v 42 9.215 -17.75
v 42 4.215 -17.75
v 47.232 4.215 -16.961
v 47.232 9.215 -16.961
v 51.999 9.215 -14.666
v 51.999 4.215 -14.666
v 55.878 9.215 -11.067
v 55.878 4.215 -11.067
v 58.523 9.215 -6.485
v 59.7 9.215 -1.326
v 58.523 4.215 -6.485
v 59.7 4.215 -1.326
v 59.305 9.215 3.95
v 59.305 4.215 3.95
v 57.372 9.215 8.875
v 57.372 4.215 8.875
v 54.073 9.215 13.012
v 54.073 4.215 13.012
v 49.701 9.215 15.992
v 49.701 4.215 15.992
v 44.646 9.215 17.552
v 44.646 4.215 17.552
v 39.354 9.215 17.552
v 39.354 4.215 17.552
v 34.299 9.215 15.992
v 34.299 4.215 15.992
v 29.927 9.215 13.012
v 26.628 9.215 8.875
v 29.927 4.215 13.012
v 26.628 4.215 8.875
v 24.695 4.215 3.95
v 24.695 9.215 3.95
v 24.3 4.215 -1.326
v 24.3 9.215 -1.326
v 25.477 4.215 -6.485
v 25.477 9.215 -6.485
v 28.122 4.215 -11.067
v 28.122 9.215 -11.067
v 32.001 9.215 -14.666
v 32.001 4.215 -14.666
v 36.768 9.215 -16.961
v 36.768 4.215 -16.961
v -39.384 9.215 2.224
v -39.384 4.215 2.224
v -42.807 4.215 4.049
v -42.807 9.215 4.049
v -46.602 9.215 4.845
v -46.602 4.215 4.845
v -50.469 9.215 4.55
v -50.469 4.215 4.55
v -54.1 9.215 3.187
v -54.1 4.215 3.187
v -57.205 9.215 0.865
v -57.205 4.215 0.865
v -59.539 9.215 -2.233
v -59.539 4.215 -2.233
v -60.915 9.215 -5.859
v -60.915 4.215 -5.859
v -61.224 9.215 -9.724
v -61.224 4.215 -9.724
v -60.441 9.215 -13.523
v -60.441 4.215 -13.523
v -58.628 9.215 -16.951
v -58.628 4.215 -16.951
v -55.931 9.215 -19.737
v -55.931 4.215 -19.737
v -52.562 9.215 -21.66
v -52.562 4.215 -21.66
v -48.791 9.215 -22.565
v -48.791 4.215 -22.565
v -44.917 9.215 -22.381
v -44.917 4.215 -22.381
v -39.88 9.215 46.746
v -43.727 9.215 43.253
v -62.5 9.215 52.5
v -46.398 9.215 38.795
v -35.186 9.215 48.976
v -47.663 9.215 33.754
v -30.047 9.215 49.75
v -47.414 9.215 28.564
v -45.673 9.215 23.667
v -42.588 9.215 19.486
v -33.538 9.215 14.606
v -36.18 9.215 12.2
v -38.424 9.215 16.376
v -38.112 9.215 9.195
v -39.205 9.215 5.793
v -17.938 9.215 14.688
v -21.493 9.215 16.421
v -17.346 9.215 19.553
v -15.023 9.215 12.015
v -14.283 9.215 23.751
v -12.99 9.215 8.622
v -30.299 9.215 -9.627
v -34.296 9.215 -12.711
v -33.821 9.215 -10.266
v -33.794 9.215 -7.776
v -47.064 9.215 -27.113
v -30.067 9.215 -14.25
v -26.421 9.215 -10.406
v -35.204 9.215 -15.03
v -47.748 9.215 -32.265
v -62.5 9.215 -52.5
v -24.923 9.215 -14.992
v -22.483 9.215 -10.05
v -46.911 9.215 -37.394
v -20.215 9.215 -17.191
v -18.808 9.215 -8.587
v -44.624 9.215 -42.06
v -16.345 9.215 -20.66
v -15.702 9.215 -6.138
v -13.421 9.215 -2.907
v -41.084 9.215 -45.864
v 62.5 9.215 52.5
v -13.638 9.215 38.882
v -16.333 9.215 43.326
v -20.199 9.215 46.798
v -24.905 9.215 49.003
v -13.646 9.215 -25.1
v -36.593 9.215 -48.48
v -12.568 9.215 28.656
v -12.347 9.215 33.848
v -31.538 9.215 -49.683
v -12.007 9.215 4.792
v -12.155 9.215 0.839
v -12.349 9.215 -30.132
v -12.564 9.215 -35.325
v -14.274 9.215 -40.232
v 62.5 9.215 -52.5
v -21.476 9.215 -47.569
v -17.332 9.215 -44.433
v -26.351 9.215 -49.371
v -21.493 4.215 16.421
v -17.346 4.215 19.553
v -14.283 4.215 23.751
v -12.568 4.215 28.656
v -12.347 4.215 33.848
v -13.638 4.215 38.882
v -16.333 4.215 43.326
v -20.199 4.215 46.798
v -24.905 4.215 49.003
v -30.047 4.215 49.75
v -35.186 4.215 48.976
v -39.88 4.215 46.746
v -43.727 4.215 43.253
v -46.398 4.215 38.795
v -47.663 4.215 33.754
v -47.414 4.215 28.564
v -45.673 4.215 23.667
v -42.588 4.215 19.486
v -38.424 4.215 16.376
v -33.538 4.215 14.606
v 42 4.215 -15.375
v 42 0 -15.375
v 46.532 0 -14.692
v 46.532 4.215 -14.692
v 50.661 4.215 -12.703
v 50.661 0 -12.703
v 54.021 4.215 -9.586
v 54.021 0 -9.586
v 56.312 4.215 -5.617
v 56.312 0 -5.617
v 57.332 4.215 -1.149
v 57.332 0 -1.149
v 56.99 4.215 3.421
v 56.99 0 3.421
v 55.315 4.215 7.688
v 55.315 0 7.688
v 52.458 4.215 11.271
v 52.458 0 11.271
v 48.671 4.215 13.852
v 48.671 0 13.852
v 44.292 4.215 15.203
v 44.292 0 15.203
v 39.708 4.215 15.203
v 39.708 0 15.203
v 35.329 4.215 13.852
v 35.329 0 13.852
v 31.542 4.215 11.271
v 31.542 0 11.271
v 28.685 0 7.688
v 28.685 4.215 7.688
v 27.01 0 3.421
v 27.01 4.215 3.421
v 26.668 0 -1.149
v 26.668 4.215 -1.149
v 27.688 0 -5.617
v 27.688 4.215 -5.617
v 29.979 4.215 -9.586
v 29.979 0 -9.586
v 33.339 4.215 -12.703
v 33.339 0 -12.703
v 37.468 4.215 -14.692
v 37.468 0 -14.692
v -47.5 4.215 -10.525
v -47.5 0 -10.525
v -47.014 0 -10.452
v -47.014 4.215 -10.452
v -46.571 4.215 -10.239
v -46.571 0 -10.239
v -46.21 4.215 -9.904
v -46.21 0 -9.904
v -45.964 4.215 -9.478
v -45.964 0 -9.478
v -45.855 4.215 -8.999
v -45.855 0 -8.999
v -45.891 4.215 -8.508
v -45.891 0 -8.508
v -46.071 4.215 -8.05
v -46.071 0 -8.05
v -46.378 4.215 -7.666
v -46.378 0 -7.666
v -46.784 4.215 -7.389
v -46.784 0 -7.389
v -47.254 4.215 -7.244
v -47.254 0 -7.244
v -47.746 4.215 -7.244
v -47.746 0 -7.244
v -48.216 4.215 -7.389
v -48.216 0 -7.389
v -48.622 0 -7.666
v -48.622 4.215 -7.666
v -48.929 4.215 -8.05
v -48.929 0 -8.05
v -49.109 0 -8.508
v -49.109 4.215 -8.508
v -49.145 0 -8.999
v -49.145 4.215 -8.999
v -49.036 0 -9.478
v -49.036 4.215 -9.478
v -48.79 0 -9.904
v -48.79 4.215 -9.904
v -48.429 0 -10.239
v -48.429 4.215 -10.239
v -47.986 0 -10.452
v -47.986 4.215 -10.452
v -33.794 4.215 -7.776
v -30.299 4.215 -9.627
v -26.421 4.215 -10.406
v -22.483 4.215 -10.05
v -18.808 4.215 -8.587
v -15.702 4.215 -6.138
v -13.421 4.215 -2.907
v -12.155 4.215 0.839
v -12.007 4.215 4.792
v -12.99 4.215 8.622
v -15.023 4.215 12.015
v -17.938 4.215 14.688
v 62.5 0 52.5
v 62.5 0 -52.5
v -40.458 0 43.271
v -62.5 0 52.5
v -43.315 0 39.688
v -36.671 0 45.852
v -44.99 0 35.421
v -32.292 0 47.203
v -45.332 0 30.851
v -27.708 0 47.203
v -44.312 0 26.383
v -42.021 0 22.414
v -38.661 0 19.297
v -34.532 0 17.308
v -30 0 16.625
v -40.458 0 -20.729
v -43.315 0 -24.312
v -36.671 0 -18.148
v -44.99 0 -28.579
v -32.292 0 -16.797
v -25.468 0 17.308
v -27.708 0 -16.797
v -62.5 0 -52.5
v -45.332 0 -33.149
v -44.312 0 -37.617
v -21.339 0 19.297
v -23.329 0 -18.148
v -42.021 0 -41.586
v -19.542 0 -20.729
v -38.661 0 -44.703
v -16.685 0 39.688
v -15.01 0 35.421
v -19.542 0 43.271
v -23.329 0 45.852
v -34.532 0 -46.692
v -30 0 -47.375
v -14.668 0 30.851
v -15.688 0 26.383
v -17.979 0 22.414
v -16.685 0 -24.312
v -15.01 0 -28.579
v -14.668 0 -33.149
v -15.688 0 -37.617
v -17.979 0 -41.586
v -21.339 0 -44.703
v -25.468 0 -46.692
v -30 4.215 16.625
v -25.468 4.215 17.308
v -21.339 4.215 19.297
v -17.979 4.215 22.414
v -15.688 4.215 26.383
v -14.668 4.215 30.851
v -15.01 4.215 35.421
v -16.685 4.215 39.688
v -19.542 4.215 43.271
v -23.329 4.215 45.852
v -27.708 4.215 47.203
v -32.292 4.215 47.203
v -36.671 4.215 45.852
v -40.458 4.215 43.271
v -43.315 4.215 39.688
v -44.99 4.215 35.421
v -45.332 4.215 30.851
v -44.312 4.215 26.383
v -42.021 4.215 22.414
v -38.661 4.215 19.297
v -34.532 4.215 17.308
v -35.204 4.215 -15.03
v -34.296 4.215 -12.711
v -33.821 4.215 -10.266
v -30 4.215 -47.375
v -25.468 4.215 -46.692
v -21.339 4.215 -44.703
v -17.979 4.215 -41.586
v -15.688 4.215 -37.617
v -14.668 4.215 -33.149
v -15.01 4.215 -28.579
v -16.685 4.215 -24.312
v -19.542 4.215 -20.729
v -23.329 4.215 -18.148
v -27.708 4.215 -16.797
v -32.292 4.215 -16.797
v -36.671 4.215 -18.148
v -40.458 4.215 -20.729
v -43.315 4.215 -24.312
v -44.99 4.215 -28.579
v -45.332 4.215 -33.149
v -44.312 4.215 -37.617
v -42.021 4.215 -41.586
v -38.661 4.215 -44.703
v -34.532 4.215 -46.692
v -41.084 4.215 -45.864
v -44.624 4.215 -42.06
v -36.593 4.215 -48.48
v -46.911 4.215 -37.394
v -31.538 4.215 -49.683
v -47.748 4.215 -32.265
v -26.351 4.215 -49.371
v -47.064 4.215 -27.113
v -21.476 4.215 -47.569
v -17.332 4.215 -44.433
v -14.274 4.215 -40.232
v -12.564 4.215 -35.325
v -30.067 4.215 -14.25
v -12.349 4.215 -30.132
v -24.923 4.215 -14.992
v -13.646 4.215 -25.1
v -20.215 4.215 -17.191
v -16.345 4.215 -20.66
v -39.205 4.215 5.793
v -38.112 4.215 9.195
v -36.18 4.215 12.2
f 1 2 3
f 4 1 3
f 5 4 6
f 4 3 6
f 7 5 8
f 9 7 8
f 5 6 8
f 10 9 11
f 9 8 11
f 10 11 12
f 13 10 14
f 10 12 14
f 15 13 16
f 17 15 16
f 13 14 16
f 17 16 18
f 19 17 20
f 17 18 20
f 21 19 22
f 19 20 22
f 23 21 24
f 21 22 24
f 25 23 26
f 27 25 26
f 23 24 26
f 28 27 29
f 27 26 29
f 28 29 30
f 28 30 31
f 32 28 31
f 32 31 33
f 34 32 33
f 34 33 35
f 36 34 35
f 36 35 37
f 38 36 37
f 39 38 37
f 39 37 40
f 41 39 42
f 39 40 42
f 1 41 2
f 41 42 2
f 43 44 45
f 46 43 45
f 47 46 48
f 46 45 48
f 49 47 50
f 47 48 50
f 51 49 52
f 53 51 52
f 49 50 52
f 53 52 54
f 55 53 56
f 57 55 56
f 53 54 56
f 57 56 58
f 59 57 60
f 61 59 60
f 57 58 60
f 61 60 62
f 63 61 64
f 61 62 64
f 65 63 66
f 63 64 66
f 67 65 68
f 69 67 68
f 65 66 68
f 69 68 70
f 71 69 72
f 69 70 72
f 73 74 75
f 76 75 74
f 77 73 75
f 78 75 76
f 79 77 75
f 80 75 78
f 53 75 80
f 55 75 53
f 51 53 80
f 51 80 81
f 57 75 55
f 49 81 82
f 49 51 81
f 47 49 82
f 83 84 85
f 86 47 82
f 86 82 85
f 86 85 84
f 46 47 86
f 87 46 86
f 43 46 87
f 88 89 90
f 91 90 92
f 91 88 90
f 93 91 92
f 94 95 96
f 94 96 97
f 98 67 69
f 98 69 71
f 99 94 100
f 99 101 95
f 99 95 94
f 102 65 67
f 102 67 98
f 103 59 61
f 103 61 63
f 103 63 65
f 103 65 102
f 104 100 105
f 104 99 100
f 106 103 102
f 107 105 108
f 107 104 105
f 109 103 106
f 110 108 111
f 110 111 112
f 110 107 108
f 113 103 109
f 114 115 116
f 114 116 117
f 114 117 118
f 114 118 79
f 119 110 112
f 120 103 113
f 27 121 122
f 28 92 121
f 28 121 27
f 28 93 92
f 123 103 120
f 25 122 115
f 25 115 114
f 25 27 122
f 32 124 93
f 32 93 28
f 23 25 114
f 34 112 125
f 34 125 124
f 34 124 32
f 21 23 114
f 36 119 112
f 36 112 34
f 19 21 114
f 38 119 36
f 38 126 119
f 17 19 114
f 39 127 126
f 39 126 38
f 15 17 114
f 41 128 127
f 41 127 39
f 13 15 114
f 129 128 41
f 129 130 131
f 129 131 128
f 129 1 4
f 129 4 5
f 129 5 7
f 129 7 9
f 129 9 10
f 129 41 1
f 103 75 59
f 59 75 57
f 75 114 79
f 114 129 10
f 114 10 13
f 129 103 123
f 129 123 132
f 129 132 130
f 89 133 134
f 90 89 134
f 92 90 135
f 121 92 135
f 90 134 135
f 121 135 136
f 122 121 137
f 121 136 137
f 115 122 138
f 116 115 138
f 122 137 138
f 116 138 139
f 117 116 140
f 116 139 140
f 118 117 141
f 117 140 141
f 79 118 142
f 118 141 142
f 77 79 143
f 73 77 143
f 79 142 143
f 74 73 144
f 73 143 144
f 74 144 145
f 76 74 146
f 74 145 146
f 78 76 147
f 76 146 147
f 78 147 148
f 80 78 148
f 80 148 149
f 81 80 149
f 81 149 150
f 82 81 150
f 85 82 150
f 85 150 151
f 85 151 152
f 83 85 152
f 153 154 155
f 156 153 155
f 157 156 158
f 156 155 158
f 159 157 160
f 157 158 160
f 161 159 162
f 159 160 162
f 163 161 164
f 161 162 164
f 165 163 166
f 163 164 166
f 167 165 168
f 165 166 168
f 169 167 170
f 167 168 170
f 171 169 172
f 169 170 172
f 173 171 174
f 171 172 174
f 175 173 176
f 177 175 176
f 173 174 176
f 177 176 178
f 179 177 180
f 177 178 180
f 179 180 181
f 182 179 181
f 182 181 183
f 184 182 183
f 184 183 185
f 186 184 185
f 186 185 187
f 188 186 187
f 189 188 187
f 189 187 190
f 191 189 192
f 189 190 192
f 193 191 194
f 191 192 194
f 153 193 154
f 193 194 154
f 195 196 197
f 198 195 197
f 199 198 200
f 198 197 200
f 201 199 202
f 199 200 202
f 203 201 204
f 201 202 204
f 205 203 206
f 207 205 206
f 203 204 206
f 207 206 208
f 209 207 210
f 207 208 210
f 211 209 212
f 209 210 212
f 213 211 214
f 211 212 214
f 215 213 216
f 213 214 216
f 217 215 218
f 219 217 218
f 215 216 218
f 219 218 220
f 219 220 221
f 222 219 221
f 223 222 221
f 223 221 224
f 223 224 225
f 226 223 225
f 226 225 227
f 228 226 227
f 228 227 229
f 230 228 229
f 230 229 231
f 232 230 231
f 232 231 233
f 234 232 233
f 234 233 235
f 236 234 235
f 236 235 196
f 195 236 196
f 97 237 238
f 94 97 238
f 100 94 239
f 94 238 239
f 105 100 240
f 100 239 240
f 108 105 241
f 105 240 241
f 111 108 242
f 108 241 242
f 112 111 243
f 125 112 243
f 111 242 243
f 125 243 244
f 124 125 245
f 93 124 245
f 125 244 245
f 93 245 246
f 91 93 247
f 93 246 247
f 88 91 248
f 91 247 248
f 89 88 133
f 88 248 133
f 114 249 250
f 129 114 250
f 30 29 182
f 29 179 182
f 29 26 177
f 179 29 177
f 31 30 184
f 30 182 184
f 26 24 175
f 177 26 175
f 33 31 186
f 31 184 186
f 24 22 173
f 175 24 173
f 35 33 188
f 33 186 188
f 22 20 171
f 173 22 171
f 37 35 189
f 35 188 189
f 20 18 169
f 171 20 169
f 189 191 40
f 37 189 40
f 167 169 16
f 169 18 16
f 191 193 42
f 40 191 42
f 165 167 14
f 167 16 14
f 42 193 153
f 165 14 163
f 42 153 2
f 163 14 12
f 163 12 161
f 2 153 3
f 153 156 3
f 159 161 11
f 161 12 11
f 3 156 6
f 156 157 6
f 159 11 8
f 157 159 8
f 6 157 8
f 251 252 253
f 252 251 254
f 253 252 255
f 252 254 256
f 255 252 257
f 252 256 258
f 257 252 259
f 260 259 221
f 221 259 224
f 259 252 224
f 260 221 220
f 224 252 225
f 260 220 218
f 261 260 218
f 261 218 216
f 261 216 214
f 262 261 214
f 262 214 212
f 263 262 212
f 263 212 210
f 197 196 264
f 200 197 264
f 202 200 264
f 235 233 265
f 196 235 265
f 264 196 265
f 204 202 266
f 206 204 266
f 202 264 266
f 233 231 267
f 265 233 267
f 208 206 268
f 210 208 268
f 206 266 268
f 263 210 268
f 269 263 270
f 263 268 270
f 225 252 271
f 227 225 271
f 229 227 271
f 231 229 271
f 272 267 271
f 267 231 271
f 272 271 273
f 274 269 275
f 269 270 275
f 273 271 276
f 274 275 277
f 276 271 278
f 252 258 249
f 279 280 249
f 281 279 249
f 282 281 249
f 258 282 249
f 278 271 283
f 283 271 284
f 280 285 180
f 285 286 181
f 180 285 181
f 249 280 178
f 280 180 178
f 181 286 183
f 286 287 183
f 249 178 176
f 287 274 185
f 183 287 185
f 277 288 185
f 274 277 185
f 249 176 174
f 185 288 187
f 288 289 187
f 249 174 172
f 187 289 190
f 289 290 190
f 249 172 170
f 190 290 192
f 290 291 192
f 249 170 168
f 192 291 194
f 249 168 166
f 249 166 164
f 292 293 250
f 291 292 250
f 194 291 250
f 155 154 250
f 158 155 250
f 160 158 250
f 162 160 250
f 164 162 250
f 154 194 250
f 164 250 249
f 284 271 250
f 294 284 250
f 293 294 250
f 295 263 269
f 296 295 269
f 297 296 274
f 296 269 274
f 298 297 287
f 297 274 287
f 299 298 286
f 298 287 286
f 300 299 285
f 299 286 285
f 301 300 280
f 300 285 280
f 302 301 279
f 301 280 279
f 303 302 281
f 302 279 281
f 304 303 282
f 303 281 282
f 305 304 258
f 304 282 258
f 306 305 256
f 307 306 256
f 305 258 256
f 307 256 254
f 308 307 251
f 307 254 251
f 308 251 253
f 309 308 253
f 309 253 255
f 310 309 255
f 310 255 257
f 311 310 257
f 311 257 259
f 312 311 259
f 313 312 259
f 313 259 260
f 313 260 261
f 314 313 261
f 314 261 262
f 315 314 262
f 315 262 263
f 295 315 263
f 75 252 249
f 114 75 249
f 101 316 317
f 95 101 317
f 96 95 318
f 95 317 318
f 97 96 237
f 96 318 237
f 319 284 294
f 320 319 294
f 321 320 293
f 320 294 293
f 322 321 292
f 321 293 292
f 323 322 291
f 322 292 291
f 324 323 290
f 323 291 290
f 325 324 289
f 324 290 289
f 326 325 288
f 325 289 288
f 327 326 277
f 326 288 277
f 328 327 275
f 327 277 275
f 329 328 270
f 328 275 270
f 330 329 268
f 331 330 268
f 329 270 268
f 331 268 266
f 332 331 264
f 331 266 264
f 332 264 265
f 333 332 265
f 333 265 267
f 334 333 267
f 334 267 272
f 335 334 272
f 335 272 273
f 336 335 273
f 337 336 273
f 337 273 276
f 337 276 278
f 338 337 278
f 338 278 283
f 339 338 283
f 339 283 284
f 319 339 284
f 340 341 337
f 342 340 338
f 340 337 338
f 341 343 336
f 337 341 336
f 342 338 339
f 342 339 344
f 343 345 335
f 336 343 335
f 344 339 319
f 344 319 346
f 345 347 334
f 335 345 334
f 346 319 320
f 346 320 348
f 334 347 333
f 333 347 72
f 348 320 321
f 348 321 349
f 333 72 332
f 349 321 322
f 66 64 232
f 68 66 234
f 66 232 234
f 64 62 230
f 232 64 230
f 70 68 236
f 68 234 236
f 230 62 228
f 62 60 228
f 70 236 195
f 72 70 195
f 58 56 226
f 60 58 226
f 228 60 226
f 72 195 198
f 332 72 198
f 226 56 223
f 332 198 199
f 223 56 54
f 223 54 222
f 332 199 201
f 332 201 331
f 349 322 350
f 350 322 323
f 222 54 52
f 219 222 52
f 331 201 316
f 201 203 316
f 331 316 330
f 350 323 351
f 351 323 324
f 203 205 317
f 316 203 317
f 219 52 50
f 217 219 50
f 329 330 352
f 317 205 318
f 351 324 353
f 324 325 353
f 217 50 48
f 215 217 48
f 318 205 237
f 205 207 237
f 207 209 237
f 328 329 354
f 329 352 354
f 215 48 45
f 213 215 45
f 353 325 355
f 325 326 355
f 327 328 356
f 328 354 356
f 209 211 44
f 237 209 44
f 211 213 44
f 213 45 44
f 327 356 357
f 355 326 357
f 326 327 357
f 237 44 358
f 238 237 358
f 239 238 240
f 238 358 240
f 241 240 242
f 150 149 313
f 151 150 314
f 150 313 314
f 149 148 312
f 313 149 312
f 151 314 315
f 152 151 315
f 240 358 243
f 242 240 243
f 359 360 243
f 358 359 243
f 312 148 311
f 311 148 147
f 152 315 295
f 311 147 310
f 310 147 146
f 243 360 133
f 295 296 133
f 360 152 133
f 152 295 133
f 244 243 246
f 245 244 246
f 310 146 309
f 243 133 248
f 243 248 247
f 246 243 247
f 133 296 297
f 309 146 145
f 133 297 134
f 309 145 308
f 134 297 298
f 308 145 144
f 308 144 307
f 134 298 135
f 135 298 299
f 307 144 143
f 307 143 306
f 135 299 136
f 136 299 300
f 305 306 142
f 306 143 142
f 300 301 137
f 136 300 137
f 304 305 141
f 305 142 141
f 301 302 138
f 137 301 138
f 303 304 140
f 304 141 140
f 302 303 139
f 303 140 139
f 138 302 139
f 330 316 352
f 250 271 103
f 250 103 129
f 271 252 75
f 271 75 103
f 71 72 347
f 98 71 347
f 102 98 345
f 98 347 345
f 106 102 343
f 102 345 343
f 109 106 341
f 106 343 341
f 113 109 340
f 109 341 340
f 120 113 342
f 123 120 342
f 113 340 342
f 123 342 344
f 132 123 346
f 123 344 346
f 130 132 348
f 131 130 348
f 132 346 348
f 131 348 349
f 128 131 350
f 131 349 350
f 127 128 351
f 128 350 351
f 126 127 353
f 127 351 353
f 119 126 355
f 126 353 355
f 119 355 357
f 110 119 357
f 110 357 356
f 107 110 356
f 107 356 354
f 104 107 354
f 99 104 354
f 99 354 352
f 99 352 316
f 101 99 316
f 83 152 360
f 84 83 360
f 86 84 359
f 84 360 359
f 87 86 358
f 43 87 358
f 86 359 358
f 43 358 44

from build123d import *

# Parameters (mm, degrees)
SKETCH1_W                                      = 125
SKETCH1_H                                      = 105
TEST_BASE_POSTION_DEPTH                        = 9.215
THUMB_KNUCKLE_MOUNT_START                      = -4.215
SKETCH7_R                                      = 17.75
THUMB_KNUCKLE_MOUNT_DEPTH                      = 5
SKETCH8_R                                      = 15.375
THUMB_KNUCKLE_DEPTH                            = 4.215
GEARS_POSITION_EXTRUDE_CUT_START               = -4.215
SKETCH10_R                                     = 13.75
SKETCH10_R_2                                   = 17.75
GEARS_POSITION_EXTRUDE_CUT_DEPTH               = 5
SKETCH11_R                                     = 15.375
SKETCH11_R_2                                   = 1.65
FINGERS_KNUCKLE_MOUNT_AND_INTERMEDIATE_T_DEPTH = 83.142657767


with BuildPart() as part:
    # Sketch1 → Test_Base_Postion (new body)
    with BuildSketch(Plane(origin=(0, 0, 0), x_dir=(1, 0, 0), z_dir=(0, 1, 0))):
        Rectangle(SKETCH1_W, SKETCH1_H)
    extrude(amount=TEST_BASE_POSTION_DEPTH)

    # Sketch7 → Thumb_Knuckle_Mount (cut)
    with BuildSketch(Plane.XZ.offset(THUMB_KNUCKLE_MOUNT_START)):
        with Locations(Location((42, 0, 0), (0, 0, 270))):
            Circle(SKETCH7_R)
    extrude(amount=-THUMB_KNUCKLE_MOUNT_DEPTH, mode=Mode.SUBTRACT)

    # Sketch8 → Thumb_Knuckle (cut)
    with BuildSketch(Plane.XZ):
        with Locations(Location((42, 0, 0), (0, 0, 270))):
            Circle(SKETCH8_R)
    extrude(amount=-THUMB_KNUCKLE_DEPTH, mode=Mode.SUBTRACT)

    # Sketch10 → Gears_Position_Extrude_Cut (cut)
    with BuildSketch(Plane.XZ.offset(GEARS_POSITION_EXTRUDE_CUT_START)):
        with Locations((-25.678431211, 3.323807031)):
            Circle(SKETCH10_R)
        with Locations((-30, 32)):
            Circle(SKETCH10_R_2)
        with Locations((-47.5, -8.87533784)):
            Circle(SKETCH10_R)
        with Locations((-30, -32)):
            Circle(SKETCH10_R_2)
    extrude(amount=-GEARS_POSITION_EXTRUDE_CUT_DEPTH, mode=Mode.SUBTRACT)

    # Sketch11 → Fingers_Knuckle_Mount_and_Intermediate_Through_Hole (cut, through all)
    with BuildSketch(Plane.XZ):
        with Locations(Location((-30, 32, 0), (0, 0, 270))):
            Circle(SKETCH11_R)
        with Locations(Location((-30, -32, 0), (0, 0, 270))):
            Circle(SKETCH11_R)
        with Locations(Location((-47.5, -8.87533784, 0), (0, 0, 270))):
            Circle(SKETCH11_R_2)
    extrude(amount=-FINGERS_KNUCKLE_MOUNT_AND_INTERMEDIATE_T_DEPTH, mode=Mode.SUBTRACT)


solid = part.part
